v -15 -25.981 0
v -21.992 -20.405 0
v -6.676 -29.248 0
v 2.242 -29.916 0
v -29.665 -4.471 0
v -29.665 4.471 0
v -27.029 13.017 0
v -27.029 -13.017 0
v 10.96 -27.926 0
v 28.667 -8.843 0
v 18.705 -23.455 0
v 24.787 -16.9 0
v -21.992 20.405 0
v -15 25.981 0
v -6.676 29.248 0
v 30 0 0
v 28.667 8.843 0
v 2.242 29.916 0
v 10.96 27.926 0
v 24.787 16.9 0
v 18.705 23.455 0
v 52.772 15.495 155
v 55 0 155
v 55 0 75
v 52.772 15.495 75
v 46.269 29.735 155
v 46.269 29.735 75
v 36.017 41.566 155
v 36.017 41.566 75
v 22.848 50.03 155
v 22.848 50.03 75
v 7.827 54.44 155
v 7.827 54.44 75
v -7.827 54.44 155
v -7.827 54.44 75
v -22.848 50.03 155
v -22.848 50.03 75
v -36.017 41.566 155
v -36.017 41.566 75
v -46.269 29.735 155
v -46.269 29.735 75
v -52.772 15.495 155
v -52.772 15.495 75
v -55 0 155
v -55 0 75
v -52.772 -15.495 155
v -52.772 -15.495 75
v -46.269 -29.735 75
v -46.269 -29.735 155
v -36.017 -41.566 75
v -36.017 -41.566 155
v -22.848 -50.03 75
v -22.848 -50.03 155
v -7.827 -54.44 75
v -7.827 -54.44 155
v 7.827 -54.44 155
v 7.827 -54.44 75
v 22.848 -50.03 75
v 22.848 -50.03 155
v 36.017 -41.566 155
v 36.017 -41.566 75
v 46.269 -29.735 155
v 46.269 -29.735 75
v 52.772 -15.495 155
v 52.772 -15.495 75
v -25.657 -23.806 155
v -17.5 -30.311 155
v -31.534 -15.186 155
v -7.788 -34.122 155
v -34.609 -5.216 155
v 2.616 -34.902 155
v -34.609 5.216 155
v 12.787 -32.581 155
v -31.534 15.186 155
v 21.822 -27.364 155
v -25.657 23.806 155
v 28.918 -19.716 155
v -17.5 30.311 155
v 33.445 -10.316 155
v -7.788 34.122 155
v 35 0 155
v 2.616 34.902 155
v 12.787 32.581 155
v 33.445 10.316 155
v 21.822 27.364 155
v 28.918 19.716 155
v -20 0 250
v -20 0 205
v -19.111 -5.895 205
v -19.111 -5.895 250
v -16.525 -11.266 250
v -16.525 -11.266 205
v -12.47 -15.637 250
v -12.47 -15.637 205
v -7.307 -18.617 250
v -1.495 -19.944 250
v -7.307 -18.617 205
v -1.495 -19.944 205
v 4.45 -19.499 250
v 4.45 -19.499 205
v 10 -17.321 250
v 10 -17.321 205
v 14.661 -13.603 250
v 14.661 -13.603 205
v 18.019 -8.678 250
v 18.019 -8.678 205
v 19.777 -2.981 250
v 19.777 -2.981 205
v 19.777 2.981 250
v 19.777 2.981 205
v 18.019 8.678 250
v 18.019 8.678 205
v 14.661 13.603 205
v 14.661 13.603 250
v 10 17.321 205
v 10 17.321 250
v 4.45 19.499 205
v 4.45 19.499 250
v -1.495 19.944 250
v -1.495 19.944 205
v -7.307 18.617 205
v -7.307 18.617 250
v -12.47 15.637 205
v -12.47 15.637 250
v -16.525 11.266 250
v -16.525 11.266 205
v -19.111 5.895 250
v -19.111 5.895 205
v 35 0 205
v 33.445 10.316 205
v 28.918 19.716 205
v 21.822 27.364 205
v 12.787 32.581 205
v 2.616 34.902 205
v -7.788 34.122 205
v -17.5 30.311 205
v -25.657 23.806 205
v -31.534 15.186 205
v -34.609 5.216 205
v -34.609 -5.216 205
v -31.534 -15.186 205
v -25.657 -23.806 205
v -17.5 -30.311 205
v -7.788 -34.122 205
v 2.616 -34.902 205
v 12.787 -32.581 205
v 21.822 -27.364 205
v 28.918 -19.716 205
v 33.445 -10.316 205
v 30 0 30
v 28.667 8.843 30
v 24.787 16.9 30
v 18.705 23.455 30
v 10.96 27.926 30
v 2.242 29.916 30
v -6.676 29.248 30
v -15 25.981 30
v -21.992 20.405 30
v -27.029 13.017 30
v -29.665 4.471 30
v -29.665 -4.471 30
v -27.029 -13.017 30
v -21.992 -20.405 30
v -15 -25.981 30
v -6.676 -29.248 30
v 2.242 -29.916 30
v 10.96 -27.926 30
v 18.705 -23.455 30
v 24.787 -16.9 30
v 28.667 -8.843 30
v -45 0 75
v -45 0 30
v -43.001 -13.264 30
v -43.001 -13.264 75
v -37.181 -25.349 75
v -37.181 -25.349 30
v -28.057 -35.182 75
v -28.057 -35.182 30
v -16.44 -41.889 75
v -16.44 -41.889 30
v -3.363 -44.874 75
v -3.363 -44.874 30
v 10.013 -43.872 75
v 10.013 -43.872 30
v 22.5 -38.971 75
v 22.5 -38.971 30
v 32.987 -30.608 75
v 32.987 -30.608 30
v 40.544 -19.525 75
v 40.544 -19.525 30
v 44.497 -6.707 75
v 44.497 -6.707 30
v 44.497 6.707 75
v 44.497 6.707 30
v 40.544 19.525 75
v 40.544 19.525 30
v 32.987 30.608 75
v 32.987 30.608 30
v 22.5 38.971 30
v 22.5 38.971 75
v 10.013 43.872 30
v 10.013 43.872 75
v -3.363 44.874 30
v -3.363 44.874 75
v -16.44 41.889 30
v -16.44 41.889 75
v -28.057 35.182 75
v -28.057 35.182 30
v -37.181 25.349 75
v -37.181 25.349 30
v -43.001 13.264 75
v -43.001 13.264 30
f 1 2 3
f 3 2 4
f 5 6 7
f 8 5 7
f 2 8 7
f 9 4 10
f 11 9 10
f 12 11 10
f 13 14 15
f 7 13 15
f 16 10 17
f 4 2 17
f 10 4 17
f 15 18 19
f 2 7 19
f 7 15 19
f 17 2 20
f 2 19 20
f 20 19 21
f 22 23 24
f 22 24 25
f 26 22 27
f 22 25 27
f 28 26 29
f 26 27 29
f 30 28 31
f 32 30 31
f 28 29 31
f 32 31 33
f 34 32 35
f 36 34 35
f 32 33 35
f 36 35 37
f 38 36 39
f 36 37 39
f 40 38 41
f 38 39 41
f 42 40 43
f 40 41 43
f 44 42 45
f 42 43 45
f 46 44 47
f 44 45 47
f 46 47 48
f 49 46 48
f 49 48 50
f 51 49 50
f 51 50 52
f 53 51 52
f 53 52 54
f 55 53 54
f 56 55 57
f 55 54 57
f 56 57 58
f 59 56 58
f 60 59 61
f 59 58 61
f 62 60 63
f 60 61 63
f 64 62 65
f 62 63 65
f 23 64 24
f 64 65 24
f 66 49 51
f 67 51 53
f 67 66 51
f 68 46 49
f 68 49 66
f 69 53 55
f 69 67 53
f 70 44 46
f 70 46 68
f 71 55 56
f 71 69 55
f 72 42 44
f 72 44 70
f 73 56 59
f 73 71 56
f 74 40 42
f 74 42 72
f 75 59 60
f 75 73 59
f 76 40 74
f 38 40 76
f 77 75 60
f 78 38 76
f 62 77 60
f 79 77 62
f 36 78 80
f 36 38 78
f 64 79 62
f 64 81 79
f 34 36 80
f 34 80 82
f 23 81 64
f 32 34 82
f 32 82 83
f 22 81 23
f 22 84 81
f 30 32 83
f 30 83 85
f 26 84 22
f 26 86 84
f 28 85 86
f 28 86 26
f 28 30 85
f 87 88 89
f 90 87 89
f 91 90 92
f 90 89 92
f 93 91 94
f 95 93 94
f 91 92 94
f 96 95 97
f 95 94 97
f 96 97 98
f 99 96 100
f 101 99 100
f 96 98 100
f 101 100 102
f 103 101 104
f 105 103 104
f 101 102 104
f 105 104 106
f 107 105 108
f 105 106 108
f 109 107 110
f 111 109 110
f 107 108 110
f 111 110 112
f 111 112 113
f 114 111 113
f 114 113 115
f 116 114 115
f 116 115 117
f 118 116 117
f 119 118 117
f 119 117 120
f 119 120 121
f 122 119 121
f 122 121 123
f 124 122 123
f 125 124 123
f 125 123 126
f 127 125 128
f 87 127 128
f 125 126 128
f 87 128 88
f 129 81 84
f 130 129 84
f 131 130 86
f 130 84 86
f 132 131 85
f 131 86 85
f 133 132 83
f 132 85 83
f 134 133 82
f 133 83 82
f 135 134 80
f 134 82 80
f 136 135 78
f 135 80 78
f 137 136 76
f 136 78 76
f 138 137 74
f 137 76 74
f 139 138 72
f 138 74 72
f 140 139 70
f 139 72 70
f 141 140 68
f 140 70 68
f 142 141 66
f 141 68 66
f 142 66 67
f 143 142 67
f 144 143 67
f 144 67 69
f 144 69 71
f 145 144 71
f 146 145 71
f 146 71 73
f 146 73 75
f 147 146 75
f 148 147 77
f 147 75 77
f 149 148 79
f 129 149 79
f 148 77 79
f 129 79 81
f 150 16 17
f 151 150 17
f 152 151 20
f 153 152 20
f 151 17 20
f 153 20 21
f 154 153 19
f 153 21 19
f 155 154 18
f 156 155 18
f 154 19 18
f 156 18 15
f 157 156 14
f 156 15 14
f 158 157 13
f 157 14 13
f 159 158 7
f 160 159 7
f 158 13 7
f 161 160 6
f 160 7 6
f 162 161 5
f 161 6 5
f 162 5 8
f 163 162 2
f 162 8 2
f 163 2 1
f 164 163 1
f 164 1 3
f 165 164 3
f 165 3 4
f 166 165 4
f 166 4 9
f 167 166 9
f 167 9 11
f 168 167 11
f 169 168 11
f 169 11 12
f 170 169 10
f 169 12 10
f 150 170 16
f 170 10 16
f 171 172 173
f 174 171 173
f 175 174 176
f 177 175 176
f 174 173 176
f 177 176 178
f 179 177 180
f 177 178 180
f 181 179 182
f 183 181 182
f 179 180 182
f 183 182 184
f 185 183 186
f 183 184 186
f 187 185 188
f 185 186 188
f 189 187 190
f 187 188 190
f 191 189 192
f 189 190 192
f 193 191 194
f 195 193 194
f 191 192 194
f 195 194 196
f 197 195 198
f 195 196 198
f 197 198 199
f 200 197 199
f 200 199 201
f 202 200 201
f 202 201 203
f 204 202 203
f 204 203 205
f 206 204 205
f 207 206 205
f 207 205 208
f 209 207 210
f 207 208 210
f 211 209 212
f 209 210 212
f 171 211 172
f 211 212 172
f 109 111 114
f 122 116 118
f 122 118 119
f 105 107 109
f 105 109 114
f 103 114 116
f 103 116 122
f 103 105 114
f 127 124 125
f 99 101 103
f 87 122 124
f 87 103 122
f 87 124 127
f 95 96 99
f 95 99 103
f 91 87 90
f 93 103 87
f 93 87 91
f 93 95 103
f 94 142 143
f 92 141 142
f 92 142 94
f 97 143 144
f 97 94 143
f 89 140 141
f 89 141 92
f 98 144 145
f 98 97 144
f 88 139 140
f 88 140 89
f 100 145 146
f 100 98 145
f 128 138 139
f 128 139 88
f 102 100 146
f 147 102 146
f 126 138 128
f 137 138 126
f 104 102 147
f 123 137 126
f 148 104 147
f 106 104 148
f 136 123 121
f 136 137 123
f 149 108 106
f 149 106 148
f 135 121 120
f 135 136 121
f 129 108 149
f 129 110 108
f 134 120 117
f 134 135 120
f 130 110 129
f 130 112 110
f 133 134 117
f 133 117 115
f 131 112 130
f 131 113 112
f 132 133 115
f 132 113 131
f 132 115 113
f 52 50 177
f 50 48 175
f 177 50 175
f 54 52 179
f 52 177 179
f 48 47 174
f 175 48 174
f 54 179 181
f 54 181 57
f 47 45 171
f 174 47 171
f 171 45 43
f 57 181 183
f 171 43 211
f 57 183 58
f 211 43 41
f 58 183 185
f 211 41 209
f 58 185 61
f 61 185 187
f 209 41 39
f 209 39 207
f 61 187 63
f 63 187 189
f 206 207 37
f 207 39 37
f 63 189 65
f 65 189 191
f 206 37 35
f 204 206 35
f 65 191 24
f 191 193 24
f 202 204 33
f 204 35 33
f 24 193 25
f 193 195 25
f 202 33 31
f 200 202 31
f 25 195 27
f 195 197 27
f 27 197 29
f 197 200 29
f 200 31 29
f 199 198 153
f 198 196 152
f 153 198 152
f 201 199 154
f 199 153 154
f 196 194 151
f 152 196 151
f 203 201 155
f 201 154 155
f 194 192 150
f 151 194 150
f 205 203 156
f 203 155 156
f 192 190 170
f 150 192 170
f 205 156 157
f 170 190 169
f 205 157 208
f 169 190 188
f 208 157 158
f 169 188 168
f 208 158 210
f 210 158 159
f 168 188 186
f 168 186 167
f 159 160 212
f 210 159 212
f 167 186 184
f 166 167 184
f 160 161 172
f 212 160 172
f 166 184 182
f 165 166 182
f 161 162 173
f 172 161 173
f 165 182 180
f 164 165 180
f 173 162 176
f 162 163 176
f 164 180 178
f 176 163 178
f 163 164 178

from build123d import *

# Parameters (mm, degrees)
ESBO_O1_R                = 30
RESSALTO_EXTRUS_O1_DEPTH = 30
ESBO_O2_R                = 45
RESSALTO_EXTRUS_O3_DEPTH = 45
ESBO_O3_R                = 55
RESSALTO_EXTRUS_O4_DEPTH = 80
ESBO_O4_R                = 35
RESSALTO_EXTRUS_O5_DEPTH = 50
ESBO_O5_R                = 20
RESSALTO_EXTRUS_O6_DEPTH = 45


with BuildPart() as part:
    # Esboço1 → Ressalto-extrusão1 (new body)
    with BuildSketch(Plane.XY):
        Circle(ESBO_O1_R)
    extrude(amount=RESSALTO_EXTRUS_O1_DEPTH)

    # Esboço2 → Ressalto-extrusão3 (add)
    with BuildSketch(Plane.XY.offset(30)):
        with Locations(Location((0, 0, 0), (0, 0, 180))):
            Circle(ESBO_O2_R)
    extrude(amount=RESSALTO_EXTRUS_O3_DEPTH)

    # Esboço3 → Ressalto-extrusão4 (add)
    with BuildSketch(Plane.XY.offset(75)):
        Circle(ESBO_O3_R)
    extrude(amount=RESSALTO_EXTRUS_O4_DEPTH)

    # Esboço4 → Ressalto-extrusão5 (add)
    with BuildSketch(Plane.XY.offset(155)):
        Circle(ESBO_O4_R)
    extrude(amount=RESSALTO_EXTRUS_O5_DEPTH)

    # Esboço5 → Ressalto-extrusão6 (add)
    with BuildSketch(Plane.XY.offset(205)):
        with Locations(Location((0, 0, 0), (0, 0, 180))):
            Circle(ESBO_O5_R)
    extrude(amount=RESSALTO_EXTRUS_O6_DEPTH)


solid = part.part
